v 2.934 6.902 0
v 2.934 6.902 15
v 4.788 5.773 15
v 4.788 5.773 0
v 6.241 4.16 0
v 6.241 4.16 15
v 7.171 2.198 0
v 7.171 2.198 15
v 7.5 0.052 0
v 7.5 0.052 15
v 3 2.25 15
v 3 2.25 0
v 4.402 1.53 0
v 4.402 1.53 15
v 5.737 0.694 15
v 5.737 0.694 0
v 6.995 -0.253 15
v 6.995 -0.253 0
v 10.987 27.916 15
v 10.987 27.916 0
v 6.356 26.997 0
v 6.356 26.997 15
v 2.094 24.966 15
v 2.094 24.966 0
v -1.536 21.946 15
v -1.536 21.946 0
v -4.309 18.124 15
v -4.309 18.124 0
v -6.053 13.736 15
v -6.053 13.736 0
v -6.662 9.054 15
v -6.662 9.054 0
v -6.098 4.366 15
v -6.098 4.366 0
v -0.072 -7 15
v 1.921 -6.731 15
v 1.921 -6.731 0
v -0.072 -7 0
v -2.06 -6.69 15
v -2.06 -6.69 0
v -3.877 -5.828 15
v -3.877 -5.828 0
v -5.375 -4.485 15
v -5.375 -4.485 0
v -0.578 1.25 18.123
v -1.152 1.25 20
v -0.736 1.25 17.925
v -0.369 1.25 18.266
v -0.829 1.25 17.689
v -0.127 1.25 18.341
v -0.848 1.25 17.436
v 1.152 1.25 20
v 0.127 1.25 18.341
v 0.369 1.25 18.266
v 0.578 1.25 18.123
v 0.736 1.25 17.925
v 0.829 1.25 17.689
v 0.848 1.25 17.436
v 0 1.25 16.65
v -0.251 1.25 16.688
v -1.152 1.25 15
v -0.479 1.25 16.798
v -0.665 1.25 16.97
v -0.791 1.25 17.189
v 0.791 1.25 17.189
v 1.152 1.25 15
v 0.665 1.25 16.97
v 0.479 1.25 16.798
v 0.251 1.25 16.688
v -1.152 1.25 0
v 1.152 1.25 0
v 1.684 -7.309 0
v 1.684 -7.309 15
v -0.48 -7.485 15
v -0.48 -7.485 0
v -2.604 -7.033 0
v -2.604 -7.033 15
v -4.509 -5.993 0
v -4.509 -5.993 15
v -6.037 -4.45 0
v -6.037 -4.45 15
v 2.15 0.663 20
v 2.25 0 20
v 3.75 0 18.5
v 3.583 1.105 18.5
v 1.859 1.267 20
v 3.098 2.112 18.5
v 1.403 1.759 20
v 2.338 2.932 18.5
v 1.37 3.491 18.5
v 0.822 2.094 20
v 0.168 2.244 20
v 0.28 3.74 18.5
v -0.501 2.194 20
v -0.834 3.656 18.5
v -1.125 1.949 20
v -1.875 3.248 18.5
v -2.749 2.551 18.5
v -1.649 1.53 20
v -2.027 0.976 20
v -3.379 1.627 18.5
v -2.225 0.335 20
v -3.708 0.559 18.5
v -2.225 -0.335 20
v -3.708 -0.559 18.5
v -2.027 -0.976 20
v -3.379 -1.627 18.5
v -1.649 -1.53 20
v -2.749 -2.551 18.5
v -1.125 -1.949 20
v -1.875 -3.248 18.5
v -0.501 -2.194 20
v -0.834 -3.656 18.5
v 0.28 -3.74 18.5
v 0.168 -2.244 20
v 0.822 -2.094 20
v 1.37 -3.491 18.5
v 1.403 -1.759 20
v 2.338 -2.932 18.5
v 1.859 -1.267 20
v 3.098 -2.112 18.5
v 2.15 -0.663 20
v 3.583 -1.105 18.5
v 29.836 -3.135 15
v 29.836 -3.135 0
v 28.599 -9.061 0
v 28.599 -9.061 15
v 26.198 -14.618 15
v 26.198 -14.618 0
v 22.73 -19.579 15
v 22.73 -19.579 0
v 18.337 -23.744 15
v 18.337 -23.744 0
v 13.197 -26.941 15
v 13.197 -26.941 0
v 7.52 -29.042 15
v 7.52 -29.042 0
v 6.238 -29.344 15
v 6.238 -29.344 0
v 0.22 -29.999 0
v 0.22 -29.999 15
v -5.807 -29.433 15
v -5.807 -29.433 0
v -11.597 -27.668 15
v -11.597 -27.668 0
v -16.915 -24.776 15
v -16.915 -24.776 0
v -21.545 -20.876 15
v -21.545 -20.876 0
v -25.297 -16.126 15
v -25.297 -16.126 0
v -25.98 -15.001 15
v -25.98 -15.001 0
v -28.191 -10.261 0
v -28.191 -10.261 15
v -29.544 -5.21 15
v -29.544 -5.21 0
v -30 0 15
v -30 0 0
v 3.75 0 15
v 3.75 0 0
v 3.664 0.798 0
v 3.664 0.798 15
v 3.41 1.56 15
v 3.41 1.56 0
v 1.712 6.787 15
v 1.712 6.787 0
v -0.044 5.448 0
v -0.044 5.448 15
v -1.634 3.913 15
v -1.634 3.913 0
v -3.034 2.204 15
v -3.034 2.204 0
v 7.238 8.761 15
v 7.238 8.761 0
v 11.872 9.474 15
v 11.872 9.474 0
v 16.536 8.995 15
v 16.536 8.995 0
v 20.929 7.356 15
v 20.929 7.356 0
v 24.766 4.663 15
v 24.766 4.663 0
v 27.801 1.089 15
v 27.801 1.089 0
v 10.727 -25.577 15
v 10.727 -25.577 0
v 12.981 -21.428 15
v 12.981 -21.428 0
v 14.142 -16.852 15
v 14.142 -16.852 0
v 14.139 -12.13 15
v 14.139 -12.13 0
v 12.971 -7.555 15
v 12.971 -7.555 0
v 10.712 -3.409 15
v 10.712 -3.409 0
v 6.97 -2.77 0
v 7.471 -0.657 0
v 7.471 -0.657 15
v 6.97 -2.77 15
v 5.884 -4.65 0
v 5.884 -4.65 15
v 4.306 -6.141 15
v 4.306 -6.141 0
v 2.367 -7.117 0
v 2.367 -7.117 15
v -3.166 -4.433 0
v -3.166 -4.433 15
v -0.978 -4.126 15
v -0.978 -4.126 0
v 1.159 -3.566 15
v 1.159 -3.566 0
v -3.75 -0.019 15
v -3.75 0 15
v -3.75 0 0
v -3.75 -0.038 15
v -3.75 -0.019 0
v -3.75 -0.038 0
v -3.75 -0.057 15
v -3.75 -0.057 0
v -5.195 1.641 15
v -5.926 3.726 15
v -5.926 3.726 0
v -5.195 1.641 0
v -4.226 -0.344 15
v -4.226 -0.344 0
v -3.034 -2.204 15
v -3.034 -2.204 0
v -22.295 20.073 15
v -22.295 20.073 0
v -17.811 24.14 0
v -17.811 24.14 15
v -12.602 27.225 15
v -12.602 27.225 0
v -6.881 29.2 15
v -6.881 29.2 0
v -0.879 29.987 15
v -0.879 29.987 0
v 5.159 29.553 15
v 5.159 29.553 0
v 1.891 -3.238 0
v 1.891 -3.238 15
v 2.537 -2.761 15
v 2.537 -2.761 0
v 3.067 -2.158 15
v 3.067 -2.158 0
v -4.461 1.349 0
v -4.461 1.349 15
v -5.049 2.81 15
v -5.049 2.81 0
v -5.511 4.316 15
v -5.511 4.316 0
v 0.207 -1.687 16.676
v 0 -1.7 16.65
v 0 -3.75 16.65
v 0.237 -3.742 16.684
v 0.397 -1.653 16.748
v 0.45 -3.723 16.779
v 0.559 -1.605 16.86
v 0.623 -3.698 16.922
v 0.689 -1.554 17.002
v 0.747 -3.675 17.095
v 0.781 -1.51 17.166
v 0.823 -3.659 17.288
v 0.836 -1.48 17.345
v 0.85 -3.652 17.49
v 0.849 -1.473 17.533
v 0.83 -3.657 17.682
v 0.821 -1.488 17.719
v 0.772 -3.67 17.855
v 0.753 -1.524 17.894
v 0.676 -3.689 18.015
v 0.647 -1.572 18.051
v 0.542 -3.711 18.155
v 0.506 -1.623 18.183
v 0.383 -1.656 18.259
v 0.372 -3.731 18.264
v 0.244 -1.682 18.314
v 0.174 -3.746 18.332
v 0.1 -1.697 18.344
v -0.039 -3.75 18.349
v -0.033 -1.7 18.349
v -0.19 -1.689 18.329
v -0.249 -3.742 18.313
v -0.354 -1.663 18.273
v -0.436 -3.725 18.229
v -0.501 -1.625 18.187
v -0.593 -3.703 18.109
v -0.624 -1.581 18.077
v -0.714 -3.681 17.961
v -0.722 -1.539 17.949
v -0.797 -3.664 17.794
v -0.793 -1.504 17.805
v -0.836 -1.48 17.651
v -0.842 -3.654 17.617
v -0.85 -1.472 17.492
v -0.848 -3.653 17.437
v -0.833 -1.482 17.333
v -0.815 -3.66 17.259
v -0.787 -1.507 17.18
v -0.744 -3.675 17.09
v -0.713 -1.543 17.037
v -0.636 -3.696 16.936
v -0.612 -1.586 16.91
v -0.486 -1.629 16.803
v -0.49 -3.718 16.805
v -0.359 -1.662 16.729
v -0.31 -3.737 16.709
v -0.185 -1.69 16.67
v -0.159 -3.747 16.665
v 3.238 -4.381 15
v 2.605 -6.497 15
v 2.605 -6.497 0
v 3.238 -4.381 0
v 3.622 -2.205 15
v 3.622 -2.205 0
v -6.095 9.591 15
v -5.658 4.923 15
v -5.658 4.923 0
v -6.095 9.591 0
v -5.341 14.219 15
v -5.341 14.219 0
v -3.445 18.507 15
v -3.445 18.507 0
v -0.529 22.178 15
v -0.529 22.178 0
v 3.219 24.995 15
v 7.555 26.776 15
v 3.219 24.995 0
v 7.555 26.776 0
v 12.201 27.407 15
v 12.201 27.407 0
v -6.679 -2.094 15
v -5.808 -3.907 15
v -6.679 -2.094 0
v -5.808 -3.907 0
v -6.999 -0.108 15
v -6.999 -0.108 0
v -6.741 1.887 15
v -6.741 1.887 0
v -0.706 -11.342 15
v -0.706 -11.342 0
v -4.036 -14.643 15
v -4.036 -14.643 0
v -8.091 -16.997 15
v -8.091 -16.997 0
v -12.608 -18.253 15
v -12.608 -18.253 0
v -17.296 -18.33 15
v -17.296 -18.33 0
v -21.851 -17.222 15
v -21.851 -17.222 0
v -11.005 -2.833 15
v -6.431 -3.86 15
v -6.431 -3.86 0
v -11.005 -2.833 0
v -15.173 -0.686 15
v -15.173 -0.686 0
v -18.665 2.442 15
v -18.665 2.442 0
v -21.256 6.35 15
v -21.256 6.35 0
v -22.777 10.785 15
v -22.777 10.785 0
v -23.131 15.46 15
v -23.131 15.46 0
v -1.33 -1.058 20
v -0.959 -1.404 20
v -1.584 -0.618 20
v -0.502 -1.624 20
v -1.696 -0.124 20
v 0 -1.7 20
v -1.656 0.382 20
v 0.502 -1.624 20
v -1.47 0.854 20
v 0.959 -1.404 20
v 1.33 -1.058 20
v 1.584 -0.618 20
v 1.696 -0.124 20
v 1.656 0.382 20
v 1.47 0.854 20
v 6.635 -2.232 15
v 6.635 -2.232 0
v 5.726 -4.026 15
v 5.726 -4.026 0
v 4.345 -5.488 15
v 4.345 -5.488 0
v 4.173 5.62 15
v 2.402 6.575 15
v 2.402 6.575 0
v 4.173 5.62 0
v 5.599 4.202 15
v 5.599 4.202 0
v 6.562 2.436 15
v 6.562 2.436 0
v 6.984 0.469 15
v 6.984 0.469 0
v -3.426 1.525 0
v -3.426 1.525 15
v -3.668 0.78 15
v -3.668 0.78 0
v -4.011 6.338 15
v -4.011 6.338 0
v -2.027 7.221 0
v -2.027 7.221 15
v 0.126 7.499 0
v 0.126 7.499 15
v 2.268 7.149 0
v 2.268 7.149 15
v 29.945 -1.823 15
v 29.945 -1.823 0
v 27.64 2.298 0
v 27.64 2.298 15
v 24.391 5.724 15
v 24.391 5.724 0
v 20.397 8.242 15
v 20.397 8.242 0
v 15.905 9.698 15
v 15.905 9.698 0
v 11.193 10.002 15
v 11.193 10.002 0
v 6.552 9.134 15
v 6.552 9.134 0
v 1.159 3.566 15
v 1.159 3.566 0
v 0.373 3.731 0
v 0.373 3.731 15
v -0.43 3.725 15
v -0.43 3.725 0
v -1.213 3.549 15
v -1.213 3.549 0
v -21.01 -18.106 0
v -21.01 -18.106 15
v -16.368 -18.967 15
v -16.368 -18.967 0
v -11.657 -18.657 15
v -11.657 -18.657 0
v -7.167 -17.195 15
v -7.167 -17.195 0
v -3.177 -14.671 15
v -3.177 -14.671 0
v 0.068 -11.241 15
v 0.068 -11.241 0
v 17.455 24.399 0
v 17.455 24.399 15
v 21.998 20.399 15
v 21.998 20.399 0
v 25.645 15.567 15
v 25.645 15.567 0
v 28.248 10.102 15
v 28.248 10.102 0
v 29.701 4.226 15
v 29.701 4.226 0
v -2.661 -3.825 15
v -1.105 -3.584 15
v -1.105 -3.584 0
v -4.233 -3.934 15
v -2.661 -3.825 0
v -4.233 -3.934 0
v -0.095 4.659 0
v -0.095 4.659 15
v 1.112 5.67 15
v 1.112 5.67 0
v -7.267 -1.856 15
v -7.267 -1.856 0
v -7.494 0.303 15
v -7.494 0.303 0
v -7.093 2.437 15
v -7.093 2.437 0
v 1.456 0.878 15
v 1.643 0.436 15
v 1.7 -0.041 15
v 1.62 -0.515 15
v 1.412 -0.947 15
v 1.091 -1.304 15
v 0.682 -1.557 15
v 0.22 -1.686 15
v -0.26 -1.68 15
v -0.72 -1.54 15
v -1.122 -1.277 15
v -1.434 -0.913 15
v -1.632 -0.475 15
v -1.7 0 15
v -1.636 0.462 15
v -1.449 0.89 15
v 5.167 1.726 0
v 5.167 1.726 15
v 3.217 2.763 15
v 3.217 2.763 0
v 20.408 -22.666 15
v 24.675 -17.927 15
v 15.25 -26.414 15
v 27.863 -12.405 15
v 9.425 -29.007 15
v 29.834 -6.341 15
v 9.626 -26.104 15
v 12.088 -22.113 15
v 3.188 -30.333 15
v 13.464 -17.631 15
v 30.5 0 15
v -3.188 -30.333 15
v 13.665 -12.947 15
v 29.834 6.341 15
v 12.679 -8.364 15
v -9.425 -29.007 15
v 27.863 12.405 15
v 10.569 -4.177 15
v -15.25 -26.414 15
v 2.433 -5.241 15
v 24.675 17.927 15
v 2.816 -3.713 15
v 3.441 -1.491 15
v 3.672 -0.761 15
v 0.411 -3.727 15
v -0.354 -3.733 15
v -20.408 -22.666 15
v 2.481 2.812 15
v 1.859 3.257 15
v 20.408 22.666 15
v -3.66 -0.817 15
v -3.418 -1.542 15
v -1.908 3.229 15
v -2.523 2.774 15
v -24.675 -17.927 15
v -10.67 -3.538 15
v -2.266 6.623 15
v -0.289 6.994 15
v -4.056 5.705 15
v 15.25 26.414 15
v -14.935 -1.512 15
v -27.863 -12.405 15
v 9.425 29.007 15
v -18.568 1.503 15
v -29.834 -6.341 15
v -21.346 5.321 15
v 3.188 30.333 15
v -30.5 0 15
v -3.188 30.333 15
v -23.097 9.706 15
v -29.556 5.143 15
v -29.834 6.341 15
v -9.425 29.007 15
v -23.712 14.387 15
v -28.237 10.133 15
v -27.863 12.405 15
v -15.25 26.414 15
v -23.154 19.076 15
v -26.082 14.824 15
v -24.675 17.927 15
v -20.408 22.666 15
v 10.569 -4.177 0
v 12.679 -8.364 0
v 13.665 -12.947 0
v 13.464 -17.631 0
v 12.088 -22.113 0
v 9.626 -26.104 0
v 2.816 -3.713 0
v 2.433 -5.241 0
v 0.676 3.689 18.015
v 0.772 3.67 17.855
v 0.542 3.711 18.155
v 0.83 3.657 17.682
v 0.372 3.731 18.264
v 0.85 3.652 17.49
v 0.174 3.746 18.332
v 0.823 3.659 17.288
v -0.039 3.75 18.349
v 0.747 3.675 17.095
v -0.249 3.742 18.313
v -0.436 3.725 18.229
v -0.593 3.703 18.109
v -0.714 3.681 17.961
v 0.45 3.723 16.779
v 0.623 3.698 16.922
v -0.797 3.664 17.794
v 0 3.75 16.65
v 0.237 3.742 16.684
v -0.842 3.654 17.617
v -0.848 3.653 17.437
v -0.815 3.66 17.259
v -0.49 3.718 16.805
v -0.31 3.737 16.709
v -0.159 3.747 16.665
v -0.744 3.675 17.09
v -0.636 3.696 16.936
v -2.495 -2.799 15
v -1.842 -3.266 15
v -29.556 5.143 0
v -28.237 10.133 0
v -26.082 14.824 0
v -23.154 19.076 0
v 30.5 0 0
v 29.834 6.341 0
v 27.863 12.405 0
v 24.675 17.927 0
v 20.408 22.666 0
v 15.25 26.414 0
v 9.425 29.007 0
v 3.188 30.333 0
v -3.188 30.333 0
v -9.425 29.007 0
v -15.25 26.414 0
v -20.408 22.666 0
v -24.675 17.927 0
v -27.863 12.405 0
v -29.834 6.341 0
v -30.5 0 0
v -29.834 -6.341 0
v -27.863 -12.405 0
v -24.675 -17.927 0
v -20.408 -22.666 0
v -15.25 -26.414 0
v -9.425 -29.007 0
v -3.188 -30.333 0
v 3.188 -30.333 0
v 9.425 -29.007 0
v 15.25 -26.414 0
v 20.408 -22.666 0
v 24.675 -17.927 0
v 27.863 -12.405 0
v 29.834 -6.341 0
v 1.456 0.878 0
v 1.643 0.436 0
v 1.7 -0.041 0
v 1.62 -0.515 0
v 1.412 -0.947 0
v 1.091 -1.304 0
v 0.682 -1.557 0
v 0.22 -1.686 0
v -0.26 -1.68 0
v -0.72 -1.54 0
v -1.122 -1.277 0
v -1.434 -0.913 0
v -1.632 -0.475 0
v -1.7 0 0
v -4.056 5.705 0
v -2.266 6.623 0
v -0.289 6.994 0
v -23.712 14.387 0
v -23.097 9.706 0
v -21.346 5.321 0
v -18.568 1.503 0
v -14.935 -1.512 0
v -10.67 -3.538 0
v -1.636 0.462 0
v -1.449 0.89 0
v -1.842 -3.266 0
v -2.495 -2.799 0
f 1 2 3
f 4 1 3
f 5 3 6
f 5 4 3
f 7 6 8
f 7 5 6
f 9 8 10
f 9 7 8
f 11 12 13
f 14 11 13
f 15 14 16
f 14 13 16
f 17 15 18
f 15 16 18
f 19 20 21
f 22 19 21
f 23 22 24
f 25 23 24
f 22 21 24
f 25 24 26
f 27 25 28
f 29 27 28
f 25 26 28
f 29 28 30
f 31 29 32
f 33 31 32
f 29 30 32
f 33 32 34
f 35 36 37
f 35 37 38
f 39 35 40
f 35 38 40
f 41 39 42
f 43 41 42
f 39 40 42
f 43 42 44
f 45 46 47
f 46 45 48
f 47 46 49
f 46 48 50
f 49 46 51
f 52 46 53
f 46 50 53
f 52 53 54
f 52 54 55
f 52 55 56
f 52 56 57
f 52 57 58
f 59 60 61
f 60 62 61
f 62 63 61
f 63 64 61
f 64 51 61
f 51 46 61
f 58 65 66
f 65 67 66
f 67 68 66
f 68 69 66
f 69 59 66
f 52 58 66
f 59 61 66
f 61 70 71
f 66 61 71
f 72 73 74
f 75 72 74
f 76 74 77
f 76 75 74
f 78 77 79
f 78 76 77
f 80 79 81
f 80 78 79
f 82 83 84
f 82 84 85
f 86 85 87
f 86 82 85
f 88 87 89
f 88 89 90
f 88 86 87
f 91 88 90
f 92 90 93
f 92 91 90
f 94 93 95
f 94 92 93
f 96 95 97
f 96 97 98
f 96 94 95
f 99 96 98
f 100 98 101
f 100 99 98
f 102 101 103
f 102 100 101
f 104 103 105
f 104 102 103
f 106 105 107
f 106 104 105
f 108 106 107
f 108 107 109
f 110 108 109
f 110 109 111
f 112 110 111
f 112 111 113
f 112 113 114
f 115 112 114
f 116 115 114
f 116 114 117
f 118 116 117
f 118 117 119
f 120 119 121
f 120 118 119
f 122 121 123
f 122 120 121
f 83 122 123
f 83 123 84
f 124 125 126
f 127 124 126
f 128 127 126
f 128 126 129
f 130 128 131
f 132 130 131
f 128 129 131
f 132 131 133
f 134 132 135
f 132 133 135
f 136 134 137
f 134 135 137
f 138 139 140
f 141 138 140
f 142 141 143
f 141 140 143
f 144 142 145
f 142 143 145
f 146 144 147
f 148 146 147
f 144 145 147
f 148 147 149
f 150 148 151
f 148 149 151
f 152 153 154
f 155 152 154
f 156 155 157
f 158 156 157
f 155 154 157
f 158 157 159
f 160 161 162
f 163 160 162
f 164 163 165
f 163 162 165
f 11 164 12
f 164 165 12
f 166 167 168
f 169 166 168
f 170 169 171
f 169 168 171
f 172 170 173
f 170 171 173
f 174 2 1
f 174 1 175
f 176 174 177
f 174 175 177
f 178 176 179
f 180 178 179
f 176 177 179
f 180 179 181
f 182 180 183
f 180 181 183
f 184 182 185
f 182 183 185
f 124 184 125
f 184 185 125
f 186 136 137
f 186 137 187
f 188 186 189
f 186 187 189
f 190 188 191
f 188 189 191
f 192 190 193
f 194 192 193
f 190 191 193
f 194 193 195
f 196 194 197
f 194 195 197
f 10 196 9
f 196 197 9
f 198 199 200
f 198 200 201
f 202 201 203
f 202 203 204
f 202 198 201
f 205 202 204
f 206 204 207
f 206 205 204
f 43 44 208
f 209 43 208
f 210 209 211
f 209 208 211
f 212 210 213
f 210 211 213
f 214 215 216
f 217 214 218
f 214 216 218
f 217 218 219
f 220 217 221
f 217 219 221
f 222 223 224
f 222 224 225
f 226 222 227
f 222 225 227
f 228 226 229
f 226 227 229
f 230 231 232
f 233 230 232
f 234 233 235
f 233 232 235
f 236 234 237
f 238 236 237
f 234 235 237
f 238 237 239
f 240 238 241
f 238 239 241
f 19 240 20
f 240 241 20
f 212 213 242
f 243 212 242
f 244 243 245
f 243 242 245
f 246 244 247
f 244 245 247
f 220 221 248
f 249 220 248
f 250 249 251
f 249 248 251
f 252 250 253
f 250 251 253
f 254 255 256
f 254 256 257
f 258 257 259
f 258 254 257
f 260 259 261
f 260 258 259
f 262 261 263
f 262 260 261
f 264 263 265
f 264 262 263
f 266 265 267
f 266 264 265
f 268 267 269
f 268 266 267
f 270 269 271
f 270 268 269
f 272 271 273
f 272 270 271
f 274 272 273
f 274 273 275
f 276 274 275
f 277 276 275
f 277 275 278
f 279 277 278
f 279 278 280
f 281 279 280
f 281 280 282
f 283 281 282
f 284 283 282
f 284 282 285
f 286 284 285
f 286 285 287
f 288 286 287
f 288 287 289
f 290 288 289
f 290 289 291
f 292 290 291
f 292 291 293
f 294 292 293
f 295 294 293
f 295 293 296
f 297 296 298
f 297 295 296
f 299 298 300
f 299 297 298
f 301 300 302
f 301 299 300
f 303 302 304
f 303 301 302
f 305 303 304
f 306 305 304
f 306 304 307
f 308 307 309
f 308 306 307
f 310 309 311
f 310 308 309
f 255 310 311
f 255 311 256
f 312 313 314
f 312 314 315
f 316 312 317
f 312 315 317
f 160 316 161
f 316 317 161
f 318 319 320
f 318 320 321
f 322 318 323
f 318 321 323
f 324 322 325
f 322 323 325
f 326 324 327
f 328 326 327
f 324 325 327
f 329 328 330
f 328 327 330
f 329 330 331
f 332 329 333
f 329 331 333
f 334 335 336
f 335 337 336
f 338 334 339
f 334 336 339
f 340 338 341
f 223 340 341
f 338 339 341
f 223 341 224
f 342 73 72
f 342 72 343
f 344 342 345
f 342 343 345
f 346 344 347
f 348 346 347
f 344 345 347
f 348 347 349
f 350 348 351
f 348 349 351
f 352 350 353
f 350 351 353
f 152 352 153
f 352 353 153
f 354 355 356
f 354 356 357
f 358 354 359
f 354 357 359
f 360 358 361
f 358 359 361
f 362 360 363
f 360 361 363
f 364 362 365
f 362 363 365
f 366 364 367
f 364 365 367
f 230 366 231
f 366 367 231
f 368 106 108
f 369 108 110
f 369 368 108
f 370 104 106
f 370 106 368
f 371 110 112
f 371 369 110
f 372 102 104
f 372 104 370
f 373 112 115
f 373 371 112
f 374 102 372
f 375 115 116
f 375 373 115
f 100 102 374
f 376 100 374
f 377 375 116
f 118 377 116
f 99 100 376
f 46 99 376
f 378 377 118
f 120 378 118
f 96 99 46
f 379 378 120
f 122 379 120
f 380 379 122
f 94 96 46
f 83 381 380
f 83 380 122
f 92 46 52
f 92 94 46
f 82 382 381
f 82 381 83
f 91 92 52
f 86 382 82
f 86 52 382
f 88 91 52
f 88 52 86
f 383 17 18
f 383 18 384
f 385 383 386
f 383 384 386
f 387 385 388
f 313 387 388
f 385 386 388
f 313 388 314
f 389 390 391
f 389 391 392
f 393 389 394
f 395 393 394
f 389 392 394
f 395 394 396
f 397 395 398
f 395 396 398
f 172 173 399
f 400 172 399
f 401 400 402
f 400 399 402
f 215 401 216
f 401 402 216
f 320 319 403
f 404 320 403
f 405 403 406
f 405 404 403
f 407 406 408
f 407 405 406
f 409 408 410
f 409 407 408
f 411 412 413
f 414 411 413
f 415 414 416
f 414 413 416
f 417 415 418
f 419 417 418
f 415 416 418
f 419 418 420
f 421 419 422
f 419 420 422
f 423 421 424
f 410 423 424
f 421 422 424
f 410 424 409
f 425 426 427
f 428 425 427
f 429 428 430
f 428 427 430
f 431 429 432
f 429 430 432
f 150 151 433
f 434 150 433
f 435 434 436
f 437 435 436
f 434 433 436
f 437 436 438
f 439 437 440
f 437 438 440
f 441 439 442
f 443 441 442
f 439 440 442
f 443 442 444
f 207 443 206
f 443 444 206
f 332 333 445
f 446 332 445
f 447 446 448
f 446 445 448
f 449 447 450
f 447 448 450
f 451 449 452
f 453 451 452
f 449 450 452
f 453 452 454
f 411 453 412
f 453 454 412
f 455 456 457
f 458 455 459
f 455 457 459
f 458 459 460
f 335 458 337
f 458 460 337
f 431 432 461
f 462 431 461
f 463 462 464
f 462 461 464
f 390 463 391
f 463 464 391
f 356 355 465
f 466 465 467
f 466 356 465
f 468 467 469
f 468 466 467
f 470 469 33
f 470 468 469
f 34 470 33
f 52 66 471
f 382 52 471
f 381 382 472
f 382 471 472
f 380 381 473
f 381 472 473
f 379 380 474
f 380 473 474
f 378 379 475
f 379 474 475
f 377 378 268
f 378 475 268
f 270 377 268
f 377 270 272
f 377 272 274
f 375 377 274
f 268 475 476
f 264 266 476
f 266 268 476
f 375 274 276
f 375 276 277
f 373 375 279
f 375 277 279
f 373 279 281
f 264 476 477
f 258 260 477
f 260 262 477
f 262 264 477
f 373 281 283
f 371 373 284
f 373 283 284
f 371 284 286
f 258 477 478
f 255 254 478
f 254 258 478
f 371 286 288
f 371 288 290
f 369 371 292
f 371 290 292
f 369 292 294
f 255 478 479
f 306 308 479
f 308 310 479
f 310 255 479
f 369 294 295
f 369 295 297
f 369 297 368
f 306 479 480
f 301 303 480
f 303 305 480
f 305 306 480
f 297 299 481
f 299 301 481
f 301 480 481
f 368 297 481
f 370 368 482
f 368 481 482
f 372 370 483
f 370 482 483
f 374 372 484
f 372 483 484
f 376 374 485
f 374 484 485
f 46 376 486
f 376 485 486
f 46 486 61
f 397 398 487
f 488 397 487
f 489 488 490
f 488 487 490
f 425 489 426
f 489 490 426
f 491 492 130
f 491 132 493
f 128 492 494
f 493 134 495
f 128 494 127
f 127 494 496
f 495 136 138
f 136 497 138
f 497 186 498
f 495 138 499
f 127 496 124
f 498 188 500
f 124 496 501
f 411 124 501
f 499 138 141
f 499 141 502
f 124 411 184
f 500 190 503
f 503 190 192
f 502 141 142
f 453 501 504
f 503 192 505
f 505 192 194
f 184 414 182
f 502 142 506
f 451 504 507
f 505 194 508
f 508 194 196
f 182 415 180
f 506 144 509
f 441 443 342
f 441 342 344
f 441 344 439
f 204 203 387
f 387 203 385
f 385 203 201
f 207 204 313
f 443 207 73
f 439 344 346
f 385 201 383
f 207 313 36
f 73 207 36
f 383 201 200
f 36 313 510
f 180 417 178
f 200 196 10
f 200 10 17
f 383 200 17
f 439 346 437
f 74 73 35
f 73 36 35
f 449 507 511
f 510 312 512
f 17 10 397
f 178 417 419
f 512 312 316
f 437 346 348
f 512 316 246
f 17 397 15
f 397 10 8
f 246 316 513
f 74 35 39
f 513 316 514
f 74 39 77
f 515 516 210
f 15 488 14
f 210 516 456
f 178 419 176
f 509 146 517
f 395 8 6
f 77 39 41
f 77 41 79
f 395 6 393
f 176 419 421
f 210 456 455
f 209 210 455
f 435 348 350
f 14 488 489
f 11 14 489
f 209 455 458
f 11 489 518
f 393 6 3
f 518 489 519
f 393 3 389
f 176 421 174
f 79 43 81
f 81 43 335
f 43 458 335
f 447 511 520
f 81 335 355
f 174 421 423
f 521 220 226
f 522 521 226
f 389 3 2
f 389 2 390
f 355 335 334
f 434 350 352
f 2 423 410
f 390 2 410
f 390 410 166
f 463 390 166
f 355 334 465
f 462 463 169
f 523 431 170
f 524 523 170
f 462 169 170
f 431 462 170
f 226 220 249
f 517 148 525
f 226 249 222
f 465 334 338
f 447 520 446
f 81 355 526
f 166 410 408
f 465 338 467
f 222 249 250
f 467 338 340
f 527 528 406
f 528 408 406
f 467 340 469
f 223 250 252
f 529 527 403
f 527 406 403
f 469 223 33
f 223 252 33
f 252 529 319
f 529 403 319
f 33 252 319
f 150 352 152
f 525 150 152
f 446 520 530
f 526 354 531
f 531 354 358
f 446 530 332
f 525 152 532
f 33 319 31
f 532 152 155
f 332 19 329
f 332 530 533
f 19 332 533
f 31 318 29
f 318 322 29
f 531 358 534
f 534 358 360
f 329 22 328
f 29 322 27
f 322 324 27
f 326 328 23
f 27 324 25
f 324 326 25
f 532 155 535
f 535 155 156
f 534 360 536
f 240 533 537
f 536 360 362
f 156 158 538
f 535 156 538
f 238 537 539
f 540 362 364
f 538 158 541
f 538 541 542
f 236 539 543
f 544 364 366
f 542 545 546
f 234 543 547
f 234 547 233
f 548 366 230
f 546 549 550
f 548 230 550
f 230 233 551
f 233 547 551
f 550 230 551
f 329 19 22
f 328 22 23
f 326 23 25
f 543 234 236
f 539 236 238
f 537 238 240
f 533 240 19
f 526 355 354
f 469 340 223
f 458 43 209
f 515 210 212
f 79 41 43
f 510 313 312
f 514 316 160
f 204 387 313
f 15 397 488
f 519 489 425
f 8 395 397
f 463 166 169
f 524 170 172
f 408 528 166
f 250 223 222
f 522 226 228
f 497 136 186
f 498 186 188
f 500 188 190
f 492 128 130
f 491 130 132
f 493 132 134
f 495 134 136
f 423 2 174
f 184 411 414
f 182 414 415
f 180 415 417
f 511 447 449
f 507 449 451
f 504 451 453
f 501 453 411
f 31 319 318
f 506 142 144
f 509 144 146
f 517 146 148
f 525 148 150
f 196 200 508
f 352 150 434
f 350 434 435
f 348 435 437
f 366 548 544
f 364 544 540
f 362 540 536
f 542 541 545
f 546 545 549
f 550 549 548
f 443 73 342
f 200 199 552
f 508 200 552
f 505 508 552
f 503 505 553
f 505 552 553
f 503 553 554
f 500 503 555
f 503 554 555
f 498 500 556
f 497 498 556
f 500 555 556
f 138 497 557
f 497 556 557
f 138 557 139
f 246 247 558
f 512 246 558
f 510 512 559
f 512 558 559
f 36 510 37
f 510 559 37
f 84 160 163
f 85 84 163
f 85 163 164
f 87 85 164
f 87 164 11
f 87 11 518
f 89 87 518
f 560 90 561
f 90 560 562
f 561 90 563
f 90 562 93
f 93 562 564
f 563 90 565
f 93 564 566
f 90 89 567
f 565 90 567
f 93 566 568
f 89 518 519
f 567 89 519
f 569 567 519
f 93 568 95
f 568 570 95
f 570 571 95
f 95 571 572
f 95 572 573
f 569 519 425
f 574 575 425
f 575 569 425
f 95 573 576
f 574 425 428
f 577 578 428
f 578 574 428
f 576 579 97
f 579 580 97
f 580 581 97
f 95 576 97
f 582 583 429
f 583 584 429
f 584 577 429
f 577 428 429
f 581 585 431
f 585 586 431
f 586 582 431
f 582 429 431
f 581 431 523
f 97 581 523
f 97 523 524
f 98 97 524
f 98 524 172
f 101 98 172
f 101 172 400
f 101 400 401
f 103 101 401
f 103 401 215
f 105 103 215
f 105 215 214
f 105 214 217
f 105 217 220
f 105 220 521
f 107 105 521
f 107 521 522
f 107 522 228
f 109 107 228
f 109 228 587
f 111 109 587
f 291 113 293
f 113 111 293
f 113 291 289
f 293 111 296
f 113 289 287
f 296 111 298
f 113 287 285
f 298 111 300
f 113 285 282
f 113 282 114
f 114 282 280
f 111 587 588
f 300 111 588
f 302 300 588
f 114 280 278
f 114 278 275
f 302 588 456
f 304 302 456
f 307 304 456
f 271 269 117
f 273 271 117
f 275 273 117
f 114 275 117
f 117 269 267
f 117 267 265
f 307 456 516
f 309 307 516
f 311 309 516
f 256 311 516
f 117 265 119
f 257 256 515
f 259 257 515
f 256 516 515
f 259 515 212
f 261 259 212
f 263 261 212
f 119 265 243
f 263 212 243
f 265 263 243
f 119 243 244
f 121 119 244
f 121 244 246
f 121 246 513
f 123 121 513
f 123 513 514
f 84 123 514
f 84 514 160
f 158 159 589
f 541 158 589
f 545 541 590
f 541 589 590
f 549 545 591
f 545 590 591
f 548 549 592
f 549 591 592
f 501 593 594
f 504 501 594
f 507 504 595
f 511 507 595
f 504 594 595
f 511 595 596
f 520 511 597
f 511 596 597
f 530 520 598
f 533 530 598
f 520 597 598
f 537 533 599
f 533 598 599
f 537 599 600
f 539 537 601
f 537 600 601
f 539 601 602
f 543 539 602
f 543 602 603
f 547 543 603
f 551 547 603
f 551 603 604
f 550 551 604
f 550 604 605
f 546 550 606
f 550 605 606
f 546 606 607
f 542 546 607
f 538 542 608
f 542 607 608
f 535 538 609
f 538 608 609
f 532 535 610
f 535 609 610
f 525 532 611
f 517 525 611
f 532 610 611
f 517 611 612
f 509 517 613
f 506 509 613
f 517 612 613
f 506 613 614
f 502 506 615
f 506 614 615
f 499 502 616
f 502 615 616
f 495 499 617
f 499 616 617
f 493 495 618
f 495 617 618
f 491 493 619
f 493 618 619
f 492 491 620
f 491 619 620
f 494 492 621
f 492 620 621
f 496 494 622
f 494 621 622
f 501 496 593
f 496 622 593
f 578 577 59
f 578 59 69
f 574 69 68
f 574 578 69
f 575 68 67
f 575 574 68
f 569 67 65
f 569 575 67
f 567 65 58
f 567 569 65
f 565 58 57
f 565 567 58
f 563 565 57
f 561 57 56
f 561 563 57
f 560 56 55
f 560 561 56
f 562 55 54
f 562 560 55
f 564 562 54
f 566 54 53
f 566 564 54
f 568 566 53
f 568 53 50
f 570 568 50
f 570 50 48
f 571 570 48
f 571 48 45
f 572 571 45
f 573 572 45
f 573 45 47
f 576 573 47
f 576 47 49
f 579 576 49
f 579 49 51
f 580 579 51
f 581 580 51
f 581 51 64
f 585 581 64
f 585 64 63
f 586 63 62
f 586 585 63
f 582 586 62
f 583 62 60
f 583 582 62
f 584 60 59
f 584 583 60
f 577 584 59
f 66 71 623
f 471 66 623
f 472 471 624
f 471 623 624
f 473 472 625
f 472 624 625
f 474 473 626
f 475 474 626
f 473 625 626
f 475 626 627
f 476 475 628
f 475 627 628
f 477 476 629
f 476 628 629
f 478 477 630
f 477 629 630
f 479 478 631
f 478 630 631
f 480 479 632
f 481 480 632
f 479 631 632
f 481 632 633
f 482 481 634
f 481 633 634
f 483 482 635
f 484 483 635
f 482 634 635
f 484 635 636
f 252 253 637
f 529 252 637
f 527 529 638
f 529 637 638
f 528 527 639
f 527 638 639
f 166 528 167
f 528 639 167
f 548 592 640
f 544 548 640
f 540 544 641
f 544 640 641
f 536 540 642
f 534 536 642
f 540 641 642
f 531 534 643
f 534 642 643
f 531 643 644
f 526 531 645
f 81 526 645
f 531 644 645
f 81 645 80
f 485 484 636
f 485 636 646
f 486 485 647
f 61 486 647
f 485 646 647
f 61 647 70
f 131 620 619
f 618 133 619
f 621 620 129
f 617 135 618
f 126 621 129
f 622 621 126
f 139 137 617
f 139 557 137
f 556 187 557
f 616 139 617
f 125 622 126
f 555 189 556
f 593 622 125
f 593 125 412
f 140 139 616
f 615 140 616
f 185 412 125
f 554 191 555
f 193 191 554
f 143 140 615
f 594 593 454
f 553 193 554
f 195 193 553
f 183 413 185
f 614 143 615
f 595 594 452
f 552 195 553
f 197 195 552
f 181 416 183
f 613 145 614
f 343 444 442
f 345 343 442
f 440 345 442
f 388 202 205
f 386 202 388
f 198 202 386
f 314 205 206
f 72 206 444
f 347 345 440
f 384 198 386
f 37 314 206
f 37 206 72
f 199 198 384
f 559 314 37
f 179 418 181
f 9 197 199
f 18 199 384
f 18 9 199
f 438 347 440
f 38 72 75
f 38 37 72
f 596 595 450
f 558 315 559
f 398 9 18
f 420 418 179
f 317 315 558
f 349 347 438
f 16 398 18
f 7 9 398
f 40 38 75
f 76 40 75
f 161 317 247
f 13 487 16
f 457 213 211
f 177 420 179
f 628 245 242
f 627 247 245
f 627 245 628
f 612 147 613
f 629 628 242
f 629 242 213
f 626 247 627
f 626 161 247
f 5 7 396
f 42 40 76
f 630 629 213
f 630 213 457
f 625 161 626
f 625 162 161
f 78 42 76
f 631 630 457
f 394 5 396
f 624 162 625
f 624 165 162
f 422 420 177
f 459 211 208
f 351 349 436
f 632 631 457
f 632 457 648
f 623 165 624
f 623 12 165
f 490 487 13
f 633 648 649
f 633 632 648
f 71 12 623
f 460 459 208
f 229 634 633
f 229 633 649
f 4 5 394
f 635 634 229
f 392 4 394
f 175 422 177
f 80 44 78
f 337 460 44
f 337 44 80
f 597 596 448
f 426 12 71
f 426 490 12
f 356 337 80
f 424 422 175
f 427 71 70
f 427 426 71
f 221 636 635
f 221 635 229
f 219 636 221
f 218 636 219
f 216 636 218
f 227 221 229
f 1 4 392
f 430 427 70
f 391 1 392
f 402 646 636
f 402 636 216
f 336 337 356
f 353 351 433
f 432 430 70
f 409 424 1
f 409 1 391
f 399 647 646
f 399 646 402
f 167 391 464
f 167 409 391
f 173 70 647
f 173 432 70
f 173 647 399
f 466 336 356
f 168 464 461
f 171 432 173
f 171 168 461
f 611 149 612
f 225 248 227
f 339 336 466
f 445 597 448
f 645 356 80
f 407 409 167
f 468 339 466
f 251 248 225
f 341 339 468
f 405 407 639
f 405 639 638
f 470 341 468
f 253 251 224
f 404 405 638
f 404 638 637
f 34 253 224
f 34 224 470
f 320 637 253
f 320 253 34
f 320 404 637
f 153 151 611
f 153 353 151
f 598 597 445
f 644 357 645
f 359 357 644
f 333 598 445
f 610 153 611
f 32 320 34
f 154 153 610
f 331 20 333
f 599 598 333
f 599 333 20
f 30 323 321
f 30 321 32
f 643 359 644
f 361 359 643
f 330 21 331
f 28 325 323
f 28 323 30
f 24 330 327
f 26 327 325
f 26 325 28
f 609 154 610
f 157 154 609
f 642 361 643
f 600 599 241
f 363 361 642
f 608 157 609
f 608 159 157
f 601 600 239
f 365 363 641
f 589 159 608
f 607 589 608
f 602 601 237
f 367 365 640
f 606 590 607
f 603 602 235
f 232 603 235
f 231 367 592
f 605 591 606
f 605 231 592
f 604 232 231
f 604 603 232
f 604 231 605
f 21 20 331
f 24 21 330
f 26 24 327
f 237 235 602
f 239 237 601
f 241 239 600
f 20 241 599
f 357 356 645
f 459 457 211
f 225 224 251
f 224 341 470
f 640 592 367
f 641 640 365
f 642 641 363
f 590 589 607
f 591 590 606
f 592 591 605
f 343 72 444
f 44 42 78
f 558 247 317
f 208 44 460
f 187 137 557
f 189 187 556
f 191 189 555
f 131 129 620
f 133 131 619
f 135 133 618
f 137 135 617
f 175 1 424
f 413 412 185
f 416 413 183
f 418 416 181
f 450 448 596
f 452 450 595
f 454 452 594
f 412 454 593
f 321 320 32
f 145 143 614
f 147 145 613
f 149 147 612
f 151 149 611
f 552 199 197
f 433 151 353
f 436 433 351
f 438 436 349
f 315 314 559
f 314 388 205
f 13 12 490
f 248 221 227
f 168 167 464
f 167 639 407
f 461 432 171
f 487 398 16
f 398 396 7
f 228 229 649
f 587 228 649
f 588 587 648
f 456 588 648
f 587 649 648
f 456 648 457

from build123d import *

# Parameters (mm, degrees)
SKETCH1_R               = 30.5
BOSS_EXTRUDE1_DEPTH     = 15
SKETCH2_R               = 3.75
BOSS_EXTRUDE2_DEPTH     = 5
CUT_EXTRUDE1_DEPTH      = 49.356100959
CUT_EXTRUDE1_DEPTH_BACK = 49.356100959
SKETCH3_R               = 0.85
CHAMFER1_SIZE           = 1.5
SKETCH4_R               = 7.5
SKETCH4_R_2             = 7
BOSS_EXTRUDE3_DEPTH     = 15


with BuildPart() as part:
    # Sketch1 → Boss-Extrude1 (new body)
    with BuildSketch(Plane.XY):
        Circle(SKETCH1_R)
        with BuildLine():
            ThreePointArc((-25.980383608, -15.000655572), (-28.977676824, -7.764936953), (-30, 0))
            ThreePointArc((-30, 0), (-28.236730197, 10.133462774), (-23.15419548, 19.075723621))
            ThreePointArc((-23.15419548, 19.075723621), (-17.661279409, 0.599319401), (1.158813729, -3.566461936))
            ThreePointArc((1.158813729, -3.566461936), (2.227035272, -3.017086989), (3.06674754, -2.158137977))
            ThreePointArc((3.06674754, -2.158137977), (-7.792065033, -16.868313668), (-25.980383608, -15.000655572))
        make_face(mode=Mode.SUBTRACT)
        with BuildLine():
            ThreePointArc((6.238091175, -29.344270625), (-11.597022419, -27.667834592), (-25.297131148, -16.126225712))
            ThreePointArc((-25.297131148, -16.126225712), (-6.027622102, -16.611674988), (3.75, 0))
            ThreePointArc((3.75, 0), (3.557611987, 1.185705254), (3.000188293, 2.24974892))
            ThreePointArc((3.000188293, 2.24974892), (13.634839116, -12.623289815), (6.238091175, -29.344270625))
        make_face(mode=Mode.SUBTRACT)
        with BuildLine():
            ThreePointArc((29.835735979, -3.135101049), (22.729997369, -19.579254828), (7.519708613, -29.042279221))
            ThreePointArc((7.519708613, -29.042279221), (13.936004079, -10.865899154), (1.158813729, 3.566461936))
            ThreePointArc((1.158813729, 3.566461936), (-0.028310145, 3.749893137), (-1.212529202, 3.548559276))
            ThreePointArc((-1.212529202, 3.548559276), (16.218859038, 9.066691512), (29.835735979, -3.135101049))
        make_face(mode=Mode.SUBTRACT)
        with BuildLine():
            ThreePointArc((1.152171862, 1.25), (0.682388392, -1.557031176), (-1.7, 0))
            ThreePointArc((-1.7, 0), (-1.557031176, 0.682388392), (-1.152171862, 1.25))
            Line((-1.152171862, 1.25), (1.152171862, 1.25))
        make_face(mode=Mode.SUBTRACT)
        with BuildLine():
            ThreePointArc((-1.104834079, -3.583551543), (-18.450600149, 2.198098635), (-22.294851286, 20.073355628))
            ThreePointArc((-22.294851286, 20.073355628), (-6.880556914, 29.200307131), (10.987051359, 27.91567127))
            ThreePointArc((10.987051359, 27.91567127), (-4.887648858, 16.982074748), (-3.033813729, -2.204194696))
            ThreePointArc((-3.033813729, -2.204194696), (-2.181228495, -3.05036756), (-1.104834079, -3.583551543))
        make_face(mode=Mode.SUBTRACT)
        with BuildLine():
            ThreePointArc((-3.033813729, 2.204194696), (-3.566461936, 1.158813729), (-3.75, 0))
            ThreePointArc((-3.75, 0), (-3.749893137, -0.028310145), (-3.749572552, -0.056618677))
            ThreePointArc((-3.749572552, -0.056618677), (-3.611032972, 18.226813335), (12.201407739, 27.406671618))
            ThreePointArc((12.201407739, 27.406671618), (25.644933357, 15.567189634), (29.944566656, -1.822889958))
            ThreePointArc((29.944566656, -1.822889958), (14.64054629, 9.896179992), (-3.033813729, 2.204194696))
        make_face(mode=Mode.SUBTRACT)
    extrude(amount=BOSS_EXTRUDE1_DEPTH)

    # Sketch2 → Boss-Extrude2 (add)
    with BuildSketch(Plane.XY.offset(15)):
        Circle(SKETCH2_R)
        with BuildLine():
            Line((-1.152171862, 1.25), (1.152171862, 1.25))
            ThreePointArc((1.152171862, 1.25), (0, -1.7), (-1.152171862, 1.25))
        make_face(mode=Mode.SUBTRACT)
    extrude(amount=BOSS_EXTRUDE2_DEPTH)

    # Sketch3 → Cut-Extrude1 (cut, two sides: drawn at the far end of the back side and taken through both)
    with BuildSketch(Plane.XZ.offset(-1.25).offset(-CUT_EXTRUDE1_DEPTH_BACK)):
        with Locations(Location((0, 17.5, 0), (0, 0, 270))):
            Circle(SKETCH3_R)
    extrude(amount=CUT_EXTRUDE1_DEPTH + CUT_EXTRUDE1_DEPTH_BACK, mode=Mode.SUBTRACT)

    # Chamfer1
    chamfer1_edges = [part.edges().sort_by_distance(p)[0] for p in [
        (-3.75, 0, 20),
    ]]
    chamfer(chamfer1_edges, length=CHAMFER1_SIZE)

    # Sketch4 → Boss-Extrude3 (add)
    with BuildSketch(Plane(origin=(0, 0, 0), x_dir=(-1, 0, 0), z_dir=(0, 0, -1))):
        Circle(SKETCH4_R)
        Circle(SKETCH4_R_2, mode=Mode.SUBTRACT)
    extrude(amount=-BOSS_EXTRUDE3_DEPTH)


solid = part.part
